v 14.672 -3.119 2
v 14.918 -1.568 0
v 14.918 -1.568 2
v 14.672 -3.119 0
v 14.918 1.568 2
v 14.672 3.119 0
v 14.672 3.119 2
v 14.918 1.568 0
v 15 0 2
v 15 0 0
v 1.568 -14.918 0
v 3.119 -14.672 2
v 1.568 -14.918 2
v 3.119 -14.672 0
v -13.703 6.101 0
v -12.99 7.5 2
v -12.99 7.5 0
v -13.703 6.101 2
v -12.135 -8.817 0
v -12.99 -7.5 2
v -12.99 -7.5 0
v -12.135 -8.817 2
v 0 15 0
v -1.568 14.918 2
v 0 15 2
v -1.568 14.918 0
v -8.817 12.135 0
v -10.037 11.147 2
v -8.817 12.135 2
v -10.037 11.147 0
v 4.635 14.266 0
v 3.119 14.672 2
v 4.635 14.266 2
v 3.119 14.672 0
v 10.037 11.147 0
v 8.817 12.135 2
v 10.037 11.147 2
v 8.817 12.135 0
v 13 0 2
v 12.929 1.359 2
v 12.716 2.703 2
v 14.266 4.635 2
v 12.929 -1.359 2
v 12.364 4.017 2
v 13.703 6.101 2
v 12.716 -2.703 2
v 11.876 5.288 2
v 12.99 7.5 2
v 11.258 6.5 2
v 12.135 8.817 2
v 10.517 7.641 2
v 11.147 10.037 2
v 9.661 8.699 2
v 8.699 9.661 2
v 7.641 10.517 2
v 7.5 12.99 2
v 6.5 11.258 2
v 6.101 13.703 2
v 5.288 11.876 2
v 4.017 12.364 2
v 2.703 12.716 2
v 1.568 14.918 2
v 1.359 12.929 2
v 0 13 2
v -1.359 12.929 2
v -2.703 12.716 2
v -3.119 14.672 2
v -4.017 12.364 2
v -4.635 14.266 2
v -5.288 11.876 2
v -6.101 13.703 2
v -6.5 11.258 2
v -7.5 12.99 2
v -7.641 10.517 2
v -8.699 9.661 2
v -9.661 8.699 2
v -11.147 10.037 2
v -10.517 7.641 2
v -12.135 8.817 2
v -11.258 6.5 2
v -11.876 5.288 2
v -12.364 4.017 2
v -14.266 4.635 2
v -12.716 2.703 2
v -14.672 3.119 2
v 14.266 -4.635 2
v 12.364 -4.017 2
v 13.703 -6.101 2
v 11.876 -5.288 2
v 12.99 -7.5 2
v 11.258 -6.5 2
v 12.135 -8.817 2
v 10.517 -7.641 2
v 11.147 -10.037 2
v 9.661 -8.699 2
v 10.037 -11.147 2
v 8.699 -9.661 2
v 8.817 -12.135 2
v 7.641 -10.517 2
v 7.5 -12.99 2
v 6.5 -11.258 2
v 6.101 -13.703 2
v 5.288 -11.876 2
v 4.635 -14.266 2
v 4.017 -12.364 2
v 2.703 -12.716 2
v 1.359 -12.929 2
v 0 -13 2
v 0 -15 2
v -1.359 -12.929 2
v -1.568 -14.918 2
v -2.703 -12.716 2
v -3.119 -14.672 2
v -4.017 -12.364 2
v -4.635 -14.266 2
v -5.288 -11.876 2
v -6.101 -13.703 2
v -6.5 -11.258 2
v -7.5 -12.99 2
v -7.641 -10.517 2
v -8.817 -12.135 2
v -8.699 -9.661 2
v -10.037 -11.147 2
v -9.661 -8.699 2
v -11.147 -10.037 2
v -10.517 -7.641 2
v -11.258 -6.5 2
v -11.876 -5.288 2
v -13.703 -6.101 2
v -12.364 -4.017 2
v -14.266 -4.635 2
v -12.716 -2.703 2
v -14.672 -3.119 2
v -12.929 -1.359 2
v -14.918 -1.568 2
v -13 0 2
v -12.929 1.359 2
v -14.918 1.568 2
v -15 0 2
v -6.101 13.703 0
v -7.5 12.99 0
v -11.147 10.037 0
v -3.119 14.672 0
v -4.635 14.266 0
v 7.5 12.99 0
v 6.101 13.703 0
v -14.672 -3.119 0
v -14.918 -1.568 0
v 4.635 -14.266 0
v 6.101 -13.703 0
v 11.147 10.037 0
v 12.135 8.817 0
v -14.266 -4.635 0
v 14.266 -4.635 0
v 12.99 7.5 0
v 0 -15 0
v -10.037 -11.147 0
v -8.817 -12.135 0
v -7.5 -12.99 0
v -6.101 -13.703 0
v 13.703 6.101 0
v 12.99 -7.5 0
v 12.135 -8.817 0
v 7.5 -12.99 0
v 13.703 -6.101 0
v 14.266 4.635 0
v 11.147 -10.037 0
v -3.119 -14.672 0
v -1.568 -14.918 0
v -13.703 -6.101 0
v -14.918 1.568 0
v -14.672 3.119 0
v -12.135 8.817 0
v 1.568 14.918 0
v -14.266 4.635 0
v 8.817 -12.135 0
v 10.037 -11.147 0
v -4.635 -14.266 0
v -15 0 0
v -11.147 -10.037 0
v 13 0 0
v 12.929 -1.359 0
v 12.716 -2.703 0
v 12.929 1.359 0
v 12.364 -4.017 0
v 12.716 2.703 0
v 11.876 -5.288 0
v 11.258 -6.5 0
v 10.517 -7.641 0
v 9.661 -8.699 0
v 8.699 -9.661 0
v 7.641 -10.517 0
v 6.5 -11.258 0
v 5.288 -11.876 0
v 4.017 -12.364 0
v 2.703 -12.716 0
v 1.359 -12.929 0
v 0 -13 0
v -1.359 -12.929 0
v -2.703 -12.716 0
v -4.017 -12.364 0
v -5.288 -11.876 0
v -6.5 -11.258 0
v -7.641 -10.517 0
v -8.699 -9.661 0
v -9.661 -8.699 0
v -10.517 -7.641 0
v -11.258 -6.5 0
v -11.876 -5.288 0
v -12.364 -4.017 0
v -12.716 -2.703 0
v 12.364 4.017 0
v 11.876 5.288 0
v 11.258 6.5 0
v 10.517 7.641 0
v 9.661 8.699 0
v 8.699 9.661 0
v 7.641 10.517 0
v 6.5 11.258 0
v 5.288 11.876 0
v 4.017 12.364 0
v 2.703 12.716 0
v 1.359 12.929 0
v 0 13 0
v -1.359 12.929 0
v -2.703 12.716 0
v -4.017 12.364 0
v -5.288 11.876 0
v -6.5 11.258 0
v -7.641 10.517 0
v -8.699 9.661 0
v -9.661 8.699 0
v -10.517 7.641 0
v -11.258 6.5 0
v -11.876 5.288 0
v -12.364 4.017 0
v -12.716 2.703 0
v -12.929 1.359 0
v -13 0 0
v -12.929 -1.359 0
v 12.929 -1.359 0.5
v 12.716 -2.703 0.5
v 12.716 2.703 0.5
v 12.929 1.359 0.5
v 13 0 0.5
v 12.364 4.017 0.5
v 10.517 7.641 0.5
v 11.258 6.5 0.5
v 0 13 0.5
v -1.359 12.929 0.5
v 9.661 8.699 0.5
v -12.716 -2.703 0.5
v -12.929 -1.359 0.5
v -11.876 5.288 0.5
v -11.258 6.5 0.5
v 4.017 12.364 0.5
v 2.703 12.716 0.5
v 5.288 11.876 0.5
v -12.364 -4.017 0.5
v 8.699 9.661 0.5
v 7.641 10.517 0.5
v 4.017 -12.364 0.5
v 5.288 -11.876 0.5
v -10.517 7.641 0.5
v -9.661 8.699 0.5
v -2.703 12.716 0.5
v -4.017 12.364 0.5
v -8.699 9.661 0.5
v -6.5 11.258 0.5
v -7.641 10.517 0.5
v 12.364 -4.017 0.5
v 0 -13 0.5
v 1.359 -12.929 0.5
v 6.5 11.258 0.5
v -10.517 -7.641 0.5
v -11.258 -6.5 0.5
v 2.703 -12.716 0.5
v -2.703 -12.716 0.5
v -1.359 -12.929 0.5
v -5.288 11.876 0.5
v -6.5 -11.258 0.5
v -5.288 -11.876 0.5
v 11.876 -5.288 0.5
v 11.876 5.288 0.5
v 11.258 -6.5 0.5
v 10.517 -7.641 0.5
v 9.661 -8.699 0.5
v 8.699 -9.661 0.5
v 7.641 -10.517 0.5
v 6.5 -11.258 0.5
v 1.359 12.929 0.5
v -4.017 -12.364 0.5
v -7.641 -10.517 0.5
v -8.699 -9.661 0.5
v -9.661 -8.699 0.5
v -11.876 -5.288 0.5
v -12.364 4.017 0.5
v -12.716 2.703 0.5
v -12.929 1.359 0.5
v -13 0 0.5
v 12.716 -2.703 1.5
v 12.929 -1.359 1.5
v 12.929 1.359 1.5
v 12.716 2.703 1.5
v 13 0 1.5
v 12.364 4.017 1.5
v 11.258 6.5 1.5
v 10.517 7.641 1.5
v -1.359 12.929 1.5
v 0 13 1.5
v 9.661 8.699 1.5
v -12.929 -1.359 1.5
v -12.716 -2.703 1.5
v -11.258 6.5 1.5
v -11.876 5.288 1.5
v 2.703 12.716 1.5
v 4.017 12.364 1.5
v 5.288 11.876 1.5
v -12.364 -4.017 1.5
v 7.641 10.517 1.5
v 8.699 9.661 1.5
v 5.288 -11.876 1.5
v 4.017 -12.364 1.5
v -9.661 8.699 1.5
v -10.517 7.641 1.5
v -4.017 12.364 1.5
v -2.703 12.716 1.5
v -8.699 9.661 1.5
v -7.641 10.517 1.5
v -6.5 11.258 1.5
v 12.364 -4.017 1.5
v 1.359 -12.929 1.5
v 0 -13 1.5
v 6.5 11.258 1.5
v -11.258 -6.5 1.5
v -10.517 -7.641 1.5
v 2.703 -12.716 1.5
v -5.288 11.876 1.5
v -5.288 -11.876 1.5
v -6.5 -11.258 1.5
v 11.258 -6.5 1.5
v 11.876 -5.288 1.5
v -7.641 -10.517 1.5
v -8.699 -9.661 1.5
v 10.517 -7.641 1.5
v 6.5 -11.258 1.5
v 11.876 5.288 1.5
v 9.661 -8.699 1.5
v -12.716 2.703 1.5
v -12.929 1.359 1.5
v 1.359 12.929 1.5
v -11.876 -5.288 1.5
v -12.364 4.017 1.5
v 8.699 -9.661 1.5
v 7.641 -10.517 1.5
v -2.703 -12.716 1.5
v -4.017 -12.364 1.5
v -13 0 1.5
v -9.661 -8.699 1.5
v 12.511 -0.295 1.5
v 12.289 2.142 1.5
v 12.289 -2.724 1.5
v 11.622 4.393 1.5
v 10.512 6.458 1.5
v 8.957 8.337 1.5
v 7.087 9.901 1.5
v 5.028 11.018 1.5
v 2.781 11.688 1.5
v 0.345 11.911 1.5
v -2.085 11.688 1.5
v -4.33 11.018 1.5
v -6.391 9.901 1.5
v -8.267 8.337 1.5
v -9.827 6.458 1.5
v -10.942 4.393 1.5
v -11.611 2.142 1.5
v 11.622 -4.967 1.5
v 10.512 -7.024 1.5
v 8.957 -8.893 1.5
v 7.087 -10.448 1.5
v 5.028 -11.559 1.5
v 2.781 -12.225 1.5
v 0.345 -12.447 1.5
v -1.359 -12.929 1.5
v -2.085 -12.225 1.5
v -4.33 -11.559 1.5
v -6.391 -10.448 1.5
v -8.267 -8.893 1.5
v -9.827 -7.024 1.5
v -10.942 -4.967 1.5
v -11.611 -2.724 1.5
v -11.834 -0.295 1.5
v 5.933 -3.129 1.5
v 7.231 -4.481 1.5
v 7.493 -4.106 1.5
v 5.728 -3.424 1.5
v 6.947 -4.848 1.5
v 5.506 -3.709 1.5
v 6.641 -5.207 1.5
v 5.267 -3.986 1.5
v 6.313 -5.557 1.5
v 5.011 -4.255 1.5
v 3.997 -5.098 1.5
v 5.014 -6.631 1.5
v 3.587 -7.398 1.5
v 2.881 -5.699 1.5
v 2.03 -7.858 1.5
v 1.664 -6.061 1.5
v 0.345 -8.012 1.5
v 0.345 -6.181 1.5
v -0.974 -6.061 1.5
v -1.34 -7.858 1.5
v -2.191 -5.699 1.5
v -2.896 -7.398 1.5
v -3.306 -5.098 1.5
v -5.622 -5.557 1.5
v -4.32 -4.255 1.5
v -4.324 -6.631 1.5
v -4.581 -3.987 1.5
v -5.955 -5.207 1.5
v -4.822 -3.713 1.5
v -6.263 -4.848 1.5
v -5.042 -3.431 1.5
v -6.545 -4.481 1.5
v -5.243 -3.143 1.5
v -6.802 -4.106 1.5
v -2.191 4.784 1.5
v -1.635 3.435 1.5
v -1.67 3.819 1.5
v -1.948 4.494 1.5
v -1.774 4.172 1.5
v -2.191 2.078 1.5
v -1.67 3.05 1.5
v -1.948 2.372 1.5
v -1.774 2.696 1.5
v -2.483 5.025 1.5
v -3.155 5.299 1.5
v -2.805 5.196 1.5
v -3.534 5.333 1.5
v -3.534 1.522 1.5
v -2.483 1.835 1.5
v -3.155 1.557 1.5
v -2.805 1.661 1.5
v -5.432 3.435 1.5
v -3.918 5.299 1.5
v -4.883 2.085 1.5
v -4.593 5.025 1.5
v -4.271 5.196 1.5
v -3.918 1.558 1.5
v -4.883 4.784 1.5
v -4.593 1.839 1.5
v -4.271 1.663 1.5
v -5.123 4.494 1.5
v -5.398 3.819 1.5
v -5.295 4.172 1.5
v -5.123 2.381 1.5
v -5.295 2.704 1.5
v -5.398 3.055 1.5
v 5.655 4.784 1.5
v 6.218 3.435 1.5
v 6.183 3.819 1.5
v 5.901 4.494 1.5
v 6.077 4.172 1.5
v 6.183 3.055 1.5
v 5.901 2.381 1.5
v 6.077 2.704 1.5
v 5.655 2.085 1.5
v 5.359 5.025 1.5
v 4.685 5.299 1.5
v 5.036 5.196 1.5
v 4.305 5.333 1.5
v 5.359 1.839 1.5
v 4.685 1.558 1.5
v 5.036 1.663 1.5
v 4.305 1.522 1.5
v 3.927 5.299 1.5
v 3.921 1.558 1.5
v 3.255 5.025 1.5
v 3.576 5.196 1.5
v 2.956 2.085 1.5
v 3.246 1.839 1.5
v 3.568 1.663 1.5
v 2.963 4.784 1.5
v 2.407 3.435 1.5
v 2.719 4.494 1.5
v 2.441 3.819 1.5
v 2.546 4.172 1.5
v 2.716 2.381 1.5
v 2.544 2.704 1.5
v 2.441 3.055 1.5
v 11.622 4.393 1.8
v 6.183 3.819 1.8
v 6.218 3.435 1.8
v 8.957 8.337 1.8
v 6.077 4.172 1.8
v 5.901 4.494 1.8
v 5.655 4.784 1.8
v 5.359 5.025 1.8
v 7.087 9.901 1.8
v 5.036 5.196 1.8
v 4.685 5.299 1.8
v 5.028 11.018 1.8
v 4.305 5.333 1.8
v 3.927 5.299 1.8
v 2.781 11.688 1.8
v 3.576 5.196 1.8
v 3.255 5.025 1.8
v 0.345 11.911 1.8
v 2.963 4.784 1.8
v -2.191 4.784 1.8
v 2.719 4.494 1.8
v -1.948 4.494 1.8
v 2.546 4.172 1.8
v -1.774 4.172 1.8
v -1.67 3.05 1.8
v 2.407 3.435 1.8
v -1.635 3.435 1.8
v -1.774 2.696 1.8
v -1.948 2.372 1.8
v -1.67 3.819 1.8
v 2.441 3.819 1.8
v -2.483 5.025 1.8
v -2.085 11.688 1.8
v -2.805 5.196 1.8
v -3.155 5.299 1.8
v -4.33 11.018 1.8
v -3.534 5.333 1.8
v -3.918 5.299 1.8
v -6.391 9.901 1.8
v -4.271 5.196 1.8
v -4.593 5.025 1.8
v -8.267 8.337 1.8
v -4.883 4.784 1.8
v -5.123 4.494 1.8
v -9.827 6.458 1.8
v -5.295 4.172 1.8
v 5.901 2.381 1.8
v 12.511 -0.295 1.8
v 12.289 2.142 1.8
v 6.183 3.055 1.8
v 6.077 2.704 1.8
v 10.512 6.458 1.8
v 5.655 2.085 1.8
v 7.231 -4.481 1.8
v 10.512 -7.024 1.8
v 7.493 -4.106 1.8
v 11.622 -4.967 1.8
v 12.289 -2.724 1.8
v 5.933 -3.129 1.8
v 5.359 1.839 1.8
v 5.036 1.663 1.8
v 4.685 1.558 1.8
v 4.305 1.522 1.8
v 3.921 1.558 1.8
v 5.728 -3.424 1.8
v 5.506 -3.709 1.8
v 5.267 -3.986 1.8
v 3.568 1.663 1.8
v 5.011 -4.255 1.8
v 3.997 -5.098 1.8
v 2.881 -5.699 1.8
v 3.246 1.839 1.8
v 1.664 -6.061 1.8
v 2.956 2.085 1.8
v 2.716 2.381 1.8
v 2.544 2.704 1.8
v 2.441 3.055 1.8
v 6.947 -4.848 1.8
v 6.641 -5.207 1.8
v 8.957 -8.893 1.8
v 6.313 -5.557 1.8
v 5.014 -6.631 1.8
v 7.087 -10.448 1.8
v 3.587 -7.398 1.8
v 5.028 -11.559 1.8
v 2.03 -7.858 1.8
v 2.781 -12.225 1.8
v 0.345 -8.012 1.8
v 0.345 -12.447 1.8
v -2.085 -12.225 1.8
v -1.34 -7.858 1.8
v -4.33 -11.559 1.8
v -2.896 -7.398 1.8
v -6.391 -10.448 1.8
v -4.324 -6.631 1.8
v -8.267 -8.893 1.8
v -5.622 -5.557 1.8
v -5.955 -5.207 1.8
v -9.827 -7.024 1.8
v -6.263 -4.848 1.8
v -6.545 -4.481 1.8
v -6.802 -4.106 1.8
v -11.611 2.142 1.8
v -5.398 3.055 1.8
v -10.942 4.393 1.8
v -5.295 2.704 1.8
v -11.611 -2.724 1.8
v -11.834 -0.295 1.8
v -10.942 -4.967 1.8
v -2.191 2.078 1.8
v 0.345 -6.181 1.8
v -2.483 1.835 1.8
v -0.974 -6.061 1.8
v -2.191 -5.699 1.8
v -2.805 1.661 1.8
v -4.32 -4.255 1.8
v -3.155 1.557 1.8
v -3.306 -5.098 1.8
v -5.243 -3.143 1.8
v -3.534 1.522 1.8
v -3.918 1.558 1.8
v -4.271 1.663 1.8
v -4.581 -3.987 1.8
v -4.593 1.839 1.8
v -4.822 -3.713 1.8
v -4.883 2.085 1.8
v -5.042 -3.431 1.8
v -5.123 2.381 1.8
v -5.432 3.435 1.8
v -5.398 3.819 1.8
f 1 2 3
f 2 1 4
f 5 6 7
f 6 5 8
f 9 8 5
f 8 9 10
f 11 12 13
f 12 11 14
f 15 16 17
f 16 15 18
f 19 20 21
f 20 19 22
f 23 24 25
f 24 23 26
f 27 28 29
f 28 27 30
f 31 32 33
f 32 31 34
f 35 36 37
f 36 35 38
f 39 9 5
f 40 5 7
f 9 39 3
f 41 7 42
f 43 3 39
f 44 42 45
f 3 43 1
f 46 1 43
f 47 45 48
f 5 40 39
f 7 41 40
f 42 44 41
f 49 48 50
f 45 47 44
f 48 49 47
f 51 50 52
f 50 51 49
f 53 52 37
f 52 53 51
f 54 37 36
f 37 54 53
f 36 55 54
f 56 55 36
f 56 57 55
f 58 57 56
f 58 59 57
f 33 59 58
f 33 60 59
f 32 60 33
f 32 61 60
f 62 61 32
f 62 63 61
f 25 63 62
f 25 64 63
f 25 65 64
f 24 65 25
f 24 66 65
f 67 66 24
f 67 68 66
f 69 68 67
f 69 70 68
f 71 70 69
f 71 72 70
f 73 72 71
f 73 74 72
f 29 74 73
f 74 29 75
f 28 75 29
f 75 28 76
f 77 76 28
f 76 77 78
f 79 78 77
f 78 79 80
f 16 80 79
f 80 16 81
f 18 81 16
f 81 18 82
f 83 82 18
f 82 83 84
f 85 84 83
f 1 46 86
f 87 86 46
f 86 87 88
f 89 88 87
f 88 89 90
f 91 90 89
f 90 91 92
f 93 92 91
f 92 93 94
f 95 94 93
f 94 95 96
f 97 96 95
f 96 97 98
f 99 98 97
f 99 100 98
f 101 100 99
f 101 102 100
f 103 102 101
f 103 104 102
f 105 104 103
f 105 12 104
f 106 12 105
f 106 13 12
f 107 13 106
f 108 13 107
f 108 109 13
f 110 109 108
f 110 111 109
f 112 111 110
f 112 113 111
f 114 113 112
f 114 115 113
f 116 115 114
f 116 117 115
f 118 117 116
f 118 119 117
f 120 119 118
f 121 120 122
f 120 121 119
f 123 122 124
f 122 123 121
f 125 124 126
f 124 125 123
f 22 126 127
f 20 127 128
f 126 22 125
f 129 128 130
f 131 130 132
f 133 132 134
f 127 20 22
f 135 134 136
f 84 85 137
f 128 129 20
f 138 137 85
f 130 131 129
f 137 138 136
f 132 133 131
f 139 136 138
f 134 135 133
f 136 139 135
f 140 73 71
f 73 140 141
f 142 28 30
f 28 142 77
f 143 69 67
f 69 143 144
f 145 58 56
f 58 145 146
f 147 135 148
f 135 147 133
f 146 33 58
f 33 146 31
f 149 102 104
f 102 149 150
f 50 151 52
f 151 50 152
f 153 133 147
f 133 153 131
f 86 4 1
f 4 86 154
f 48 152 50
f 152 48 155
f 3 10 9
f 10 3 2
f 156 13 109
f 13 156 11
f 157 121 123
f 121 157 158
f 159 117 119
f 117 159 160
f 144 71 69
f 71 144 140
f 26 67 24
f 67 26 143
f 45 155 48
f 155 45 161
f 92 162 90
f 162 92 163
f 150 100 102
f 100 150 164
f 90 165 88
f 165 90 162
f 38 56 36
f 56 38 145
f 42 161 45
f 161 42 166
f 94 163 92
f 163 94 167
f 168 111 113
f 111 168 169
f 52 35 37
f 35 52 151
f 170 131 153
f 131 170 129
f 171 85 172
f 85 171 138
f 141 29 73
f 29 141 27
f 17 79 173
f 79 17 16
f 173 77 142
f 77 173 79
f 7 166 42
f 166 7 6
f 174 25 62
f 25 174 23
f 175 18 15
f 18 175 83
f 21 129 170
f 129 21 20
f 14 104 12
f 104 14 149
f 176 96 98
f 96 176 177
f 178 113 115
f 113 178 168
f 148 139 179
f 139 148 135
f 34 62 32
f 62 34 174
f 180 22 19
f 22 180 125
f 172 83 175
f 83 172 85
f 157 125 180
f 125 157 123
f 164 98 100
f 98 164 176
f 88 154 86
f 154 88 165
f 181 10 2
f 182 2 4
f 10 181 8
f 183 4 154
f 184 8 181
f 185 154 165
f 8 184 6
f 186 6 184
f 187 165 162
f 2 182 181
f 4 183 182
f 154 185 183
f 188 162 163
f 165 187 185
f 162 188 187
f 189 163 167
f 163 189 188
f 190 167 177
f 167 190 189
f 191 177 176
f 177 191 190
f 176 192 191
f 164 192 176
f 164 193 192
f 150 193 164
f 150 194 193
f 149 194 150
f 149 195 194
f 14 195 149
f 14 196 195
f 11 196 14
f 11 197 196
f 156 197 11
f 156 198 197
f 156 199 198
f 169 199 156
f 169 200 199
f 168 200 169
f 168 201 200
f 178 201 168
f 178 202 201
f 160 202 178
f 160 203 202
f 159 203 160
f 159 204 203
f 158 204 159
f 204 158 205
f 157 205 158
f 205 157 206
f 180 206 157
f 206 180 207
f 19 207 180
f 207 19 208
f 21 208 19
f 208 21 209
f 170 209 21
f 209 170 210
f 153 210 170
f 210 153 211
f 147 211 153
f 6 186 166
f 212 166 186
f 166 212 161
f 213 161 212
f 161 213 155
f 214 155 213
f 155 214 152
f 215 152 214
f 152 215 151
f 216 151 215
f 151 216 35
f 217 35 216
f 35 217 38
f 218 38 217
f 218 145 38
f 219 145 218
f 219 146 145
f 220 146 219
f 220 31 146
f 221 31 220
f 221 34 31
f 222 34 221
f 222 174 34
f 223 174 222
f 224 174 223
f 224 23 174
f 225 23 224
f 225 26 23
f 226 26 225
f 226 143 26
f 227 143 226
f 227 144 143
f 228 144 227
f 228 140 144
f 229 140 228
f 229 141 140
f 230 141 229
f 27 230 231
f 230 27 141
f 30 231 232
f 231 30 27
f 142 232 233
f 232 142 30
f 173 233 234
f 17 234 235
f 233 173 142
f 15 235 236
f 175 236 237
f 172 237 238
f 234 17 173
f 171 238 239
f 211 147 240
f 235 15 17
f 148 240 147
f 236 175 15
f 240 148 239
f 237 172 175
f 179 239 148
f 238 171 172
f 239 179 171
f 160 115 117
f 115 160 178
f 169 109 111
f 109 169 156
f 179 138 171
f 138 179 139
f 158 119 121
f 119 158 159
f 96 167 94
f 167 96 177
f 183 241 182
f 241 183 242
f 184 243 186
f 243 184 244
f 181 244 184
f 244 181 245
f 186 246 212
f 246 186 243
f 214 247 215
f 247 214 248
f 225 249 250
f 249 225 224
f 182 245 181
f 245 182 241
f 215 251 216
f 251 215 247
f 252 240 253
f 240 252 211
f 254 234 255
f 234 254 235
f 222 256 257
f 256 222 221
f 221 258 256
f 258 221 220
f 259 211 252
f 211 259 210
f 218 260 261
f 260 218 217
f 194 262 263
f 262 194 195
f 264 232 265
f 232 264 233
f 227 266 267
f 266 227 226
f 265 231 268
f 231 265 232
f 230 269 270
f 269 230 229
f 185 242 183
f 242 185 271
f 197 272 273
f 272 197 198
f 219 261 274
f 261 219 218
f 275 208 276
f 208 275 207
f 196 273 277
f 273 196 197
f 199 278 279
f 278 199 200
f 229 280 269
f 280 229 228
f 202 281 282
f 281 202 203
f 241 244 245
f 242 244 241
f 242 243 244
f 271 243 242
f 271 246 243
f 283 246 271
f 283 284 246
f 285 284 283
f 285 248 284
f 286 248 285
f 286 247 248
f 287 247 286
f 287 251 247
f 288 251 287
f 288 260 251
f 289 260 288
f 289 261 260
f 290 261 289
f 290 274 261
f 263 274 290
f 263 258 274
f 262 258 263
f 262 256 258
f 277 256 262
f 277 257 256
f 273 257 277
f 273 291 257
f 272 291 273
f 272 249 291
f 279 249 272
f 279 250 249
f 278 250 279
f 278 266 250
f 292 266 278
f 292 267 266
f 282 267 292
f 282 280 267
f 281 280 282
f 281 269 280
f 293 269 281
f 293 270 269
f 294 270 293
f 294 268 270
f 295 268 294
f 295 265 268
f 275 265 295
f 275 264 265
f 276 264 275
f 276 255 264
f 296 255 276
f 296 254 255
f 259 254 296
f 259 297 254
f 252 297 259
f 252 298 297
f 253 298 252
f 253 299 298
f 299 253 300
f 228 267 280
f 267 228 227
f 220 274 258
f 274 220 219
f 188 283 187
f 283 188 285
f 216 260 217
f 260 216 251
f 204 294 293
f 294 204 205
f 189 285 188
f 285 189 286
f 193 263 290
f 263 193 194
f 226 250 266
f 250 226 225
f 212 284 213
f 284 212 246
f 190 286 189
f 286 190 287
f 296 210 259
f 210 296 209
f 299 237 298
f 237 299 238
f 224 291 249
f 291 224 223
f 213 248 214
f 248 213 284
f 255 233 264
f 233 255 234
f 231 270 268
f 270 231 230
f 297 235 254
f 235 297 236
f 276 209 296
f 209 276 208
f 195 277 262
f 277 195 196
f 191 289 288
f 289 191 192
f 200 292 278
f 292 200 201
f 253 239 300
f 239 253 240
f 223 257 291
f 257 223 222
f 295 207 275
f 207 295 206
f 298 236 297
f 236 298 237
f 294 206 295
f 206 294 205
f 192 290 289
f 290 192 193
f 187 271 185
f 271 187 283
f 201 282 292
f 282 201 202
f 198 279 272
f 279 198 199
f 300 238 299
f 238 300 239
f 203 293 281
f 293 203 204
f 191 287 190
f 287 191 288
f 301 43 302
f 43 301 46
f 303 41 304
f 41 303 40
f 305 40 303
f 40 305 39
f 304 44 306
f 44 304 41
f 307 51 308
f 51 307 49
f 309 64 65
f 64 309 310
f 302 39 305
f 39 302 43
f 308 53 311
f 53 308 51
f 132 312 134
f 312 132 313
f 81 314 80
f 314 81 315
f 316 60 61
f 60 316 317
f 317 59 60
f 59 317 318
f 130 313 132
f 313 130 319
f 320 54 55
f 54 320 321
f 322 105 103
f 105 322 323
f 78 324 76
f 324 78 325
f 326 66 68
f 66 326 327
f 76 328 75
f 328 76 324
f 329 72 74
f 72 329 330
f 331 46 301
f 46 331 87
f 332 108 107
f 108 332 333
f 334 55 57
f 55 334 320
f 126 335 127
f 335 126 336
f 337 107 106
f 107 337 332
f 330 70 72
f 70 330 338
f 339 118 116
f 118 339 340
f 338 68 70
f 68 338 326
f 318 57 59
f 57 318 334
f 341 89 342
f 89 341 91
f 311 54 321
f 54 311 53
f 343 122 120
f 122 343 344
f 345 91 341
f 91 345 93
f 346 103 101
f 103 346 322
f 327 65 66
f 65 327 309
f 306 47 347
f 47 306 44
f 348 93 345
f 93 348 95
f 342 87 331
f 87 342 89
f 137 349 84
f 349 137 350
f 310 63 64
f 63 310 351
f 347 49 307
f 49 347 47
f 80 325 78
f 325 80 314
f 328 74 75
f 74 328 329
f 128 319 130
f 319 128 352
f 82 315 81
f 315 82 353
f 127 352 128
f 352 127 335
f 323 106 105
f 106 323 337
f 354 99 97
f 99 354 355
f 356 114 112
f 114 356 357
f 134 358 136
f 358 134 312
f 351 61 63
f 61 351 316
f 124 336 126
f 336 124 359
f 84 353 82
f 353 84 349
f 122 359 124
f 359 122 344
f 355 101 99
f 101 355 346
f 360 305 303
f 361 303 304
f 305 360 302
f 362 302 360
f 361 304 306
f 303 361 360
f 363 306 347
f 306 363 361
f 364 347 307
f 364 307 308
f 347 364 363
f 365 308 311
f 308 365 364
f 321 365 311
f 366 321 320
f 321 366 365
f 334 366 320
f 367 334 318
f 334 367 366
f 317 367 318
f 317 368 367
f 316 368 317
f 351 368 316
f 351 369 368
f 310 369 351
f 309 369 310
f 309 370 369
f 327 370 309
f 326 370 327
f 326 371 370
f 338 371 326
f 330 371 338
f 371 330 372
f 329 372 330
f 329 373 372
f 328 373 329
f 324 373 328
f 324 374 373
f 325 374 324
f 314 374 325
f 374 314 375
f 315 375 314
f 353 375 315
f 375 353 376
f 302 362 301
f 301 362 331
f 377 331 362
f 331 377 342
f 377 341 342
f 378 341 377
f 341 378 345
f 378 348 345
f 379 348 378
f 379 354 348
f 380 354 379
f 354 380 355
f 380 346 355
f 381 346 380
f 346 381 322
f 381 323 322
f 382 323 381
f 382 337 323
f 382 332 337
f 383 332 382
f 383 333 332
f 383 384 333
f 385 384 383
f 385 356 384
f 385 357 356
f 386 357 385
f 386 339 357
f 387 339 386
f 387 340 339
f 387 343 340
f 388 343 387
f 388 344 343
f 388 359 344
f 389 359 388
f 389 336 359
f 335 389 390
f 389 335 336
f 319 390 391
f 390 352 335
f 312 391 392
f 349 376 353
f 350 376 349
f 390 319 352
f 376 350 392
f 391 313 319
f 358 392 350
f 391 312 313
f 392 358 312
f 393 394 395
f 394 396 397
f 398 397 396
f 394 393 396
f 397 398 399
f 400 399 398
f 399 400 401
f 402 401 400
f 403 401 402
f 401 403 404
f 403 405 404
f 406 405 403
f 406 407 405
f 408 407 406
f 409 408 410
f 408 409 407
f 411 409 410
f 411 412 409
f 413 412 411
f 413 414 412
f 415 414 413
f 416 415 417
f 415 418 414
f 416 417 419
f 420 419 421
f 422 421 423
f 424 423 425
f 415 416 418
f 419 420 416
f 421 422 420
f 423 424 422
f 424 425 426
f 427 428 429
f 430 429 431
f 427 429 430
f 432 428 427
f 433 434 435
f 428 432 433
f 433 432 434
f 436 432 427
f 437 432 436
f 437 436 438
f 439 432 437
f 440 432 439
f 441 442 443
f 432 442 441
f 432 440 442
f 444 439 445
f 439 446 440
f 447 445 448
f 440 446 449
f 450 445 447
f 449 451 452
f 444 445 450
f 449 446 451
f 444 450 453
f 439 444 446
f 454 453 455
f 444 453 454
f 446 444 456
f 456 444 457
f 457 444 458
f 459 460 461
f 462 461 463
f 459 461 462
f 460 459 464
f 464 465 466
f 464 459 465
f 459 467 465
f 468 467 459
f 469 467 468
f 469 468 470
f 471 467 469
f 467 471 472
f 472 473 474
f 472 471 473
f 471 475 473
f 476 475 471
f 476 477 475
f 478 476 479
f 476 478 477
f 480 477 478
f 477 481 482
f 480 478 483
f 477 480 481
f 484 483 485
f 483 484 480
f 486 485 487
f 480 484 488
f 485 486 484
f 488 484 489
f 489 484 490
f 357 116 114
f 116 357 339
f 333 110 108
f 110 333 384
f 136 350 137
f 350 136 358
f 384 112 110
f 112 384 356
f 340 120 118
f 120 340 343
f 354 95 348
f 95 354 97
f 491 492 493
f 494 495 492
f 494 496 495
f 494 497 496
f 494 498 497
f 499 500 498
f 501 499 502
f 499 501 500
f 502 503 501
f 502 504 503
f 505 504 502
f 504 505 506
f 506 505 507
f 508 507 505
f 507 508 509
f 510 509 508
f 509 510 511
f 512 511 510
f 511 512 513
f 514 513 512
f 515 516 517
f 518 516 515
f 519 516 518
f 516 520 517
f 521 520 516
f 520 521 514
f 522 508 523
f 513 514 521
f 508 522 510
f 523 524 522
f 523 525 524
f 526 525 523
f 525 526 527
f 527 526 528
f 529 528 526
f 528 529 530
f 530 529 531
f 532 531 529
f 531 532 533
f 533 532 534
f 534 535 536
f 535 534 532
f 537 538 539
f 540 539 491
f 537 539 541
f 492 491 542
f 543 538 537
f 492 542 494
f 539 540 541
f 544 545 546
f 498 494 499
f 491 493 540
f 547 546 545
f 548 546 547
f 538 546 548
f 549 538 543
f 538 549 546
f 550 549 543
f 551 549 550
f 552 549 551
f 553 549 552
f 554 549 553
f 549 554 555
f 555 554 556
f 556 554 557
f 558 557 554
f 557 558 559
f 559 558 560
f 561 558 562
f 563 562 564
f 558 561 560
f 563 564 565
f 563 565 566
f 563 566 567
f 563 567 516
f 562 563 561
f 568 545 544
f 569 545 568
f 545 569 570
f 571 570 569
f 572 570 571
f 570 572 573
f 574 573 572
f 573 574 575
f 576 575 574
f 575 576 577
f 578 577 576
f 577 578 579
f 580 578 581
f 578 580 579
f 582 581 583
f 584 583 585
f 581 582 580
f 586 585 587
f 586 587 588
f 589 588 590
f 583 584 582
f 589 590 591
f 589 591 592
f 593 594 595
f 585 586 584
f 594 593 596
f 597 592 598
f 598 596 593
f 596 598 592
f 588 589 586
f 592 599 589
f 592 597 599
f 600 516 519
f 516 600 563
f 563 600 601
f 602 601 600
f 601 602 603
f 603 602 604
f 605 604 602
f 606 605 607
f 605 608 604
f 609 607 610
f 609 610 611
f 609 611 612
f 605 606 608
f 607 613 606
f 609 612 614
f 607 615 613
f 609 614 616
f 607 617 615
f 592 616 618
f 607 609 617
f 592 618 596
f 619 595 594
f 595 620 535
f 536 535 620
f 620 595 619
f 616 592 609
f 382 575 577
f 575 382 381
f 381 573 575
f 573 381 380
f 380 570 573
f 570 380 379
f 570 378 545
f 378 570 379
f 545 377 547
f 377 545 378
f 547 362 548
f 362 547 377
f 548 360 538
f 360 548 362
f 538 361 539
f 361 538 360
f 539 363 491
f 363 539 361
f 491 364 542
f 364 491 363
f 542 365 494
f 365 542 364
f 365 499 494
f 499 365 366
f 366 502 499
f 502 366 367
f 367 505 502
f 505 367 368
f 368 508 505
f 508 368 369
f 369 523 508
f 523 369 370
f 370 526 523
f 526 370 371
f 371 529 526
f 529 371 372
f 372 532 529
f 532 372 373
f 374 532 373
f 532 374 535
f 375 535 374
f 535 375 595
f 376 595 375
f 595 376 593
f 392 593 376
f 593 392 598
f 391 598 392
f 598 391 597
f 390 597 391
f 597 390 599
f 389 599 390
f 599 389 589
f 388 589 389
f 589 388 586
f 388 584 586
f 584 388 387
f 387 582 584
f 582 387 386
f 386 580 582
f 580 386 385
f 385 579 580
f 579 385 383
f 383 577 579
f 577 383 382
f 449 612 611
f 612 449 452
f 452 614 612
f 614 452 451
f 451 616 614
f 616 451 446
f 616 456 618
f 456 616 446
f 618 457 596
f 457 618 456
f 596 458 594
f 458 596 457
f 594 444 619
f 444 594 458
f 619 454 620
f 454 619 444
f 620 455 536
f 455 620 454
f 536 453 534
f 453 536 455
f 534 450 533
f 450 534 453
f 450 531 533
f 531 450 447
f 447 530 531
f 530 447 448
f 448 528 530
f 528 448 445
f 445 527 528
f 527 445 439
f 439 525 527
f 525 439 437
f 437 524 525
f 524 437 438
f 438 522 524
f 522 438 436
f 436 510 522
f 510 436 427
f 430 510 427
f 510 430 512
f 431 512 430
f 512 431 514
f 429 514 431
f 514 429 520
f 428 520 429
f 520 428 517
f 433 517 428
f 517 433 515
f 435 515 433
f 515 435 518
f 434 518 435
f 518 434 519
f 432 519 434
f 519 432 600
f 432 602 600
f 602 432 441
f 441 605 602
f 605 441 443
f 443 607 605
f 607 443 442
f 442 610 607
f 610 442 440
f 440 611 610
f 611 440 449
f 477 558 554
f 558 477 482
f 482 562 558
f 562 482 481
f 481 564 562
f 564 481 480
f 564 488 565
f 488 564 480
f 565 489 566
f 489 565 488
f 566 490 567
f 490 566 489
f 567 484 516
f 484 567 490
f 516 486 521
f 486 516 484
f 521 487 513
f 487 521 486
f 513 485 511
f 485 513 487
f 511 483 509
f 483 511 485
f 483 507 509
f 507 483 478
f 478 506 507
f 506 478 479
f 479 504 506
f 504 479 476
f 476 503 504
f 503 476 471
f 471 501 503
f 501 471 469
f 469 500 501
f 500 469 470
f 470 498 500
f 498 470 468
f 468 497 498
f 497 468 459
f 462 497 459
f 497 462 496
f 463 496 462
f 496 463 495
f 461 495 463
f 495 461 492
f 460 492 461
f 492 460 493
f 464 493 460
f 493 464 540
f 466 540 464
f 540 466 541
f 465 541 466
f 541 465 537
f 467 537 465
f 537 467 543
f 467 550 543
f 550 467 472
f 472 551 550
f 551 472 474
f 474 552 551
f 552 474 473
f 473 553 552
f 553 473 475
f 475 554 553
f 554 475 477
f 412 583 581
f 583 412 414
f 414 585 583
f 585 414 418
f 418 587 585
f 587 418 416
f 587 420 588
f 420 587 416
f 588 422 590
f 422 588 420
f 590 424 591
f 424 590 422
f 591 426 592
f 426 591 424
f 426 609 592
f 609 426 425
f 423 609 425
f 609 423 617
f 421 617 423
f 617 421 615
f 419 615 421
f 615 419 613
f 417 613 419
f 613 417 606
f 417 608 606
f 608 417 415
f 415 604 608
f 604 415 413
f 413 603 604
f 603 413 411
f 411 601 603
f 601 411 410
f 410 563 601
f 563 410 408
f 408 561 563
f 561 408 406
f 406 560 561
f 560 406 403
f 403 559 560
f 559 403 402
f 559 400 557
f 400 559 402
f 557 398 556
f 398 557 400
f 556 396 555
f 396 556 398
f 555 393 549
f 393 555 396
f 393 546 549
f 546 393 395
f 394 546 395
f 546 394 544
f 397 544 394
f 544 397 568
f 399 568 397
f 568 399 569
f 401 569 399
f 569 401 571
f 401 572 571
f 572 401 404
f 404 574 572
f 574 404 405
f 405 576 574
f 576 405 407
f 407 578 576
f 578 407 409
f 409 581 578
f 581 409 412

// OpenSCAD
// file: token-empty.scad
module token_empty(diameter_mm=30, thickness_mm=2, ridge_width_mm=2, ridge_depth_mm=0.5) {
    $fn=60;
    difference() {
        cylinder(r=diameter_mm/2, h=thickness_mm);
        translate([0,0,-ridge_depth_mm]) {
            cylinder(r=diameter_mm/2-ridge_width_mm, h=2*ridge_depth_mm);
        }
        translate([0,0,thickness_mm-ridge_depth_mm]) {
            cylinder(r=diameter_mm/2-ridge_width_mm, h=2*ridge_depth_mm);
        }
    }
}

token_empty();
// main file
use <token-empty.scad>

module token_with_symbol(symbol, adjust_height_mm=0, font="Arial Unicode MS", symbol_thickness_mm=0.3, size=14, diameter_mm=30, thickness_mm=2, ridge_width_mm=2, ridge_depth_mm=0.5, color_token="lightgrey", color_symbol="blue") {
    color(color_token)
    token_empty(diameter_mm, thickness_mm, ridge_width_mm, ridge_depth_mm);
    color(color_symbol)
    translate([0, adjust_height_mm, thickness_mm-ridge_depth_mm+symbol_thickness_mm]) {
        scale([1,1,-2*symbol_thickness_mm]) {
            linear_extrude(1) text(symbol, halign="center", valign="center", size=size, font=font);
        }
    }
}

token_with_symbol(symbol="☻", adjust_height_mm=-0.5, size=20);
//token_with_symbol(symbol="❤︎", adjust_height_mm=-1.5);
//token_with_symbol(symbol="❥");
